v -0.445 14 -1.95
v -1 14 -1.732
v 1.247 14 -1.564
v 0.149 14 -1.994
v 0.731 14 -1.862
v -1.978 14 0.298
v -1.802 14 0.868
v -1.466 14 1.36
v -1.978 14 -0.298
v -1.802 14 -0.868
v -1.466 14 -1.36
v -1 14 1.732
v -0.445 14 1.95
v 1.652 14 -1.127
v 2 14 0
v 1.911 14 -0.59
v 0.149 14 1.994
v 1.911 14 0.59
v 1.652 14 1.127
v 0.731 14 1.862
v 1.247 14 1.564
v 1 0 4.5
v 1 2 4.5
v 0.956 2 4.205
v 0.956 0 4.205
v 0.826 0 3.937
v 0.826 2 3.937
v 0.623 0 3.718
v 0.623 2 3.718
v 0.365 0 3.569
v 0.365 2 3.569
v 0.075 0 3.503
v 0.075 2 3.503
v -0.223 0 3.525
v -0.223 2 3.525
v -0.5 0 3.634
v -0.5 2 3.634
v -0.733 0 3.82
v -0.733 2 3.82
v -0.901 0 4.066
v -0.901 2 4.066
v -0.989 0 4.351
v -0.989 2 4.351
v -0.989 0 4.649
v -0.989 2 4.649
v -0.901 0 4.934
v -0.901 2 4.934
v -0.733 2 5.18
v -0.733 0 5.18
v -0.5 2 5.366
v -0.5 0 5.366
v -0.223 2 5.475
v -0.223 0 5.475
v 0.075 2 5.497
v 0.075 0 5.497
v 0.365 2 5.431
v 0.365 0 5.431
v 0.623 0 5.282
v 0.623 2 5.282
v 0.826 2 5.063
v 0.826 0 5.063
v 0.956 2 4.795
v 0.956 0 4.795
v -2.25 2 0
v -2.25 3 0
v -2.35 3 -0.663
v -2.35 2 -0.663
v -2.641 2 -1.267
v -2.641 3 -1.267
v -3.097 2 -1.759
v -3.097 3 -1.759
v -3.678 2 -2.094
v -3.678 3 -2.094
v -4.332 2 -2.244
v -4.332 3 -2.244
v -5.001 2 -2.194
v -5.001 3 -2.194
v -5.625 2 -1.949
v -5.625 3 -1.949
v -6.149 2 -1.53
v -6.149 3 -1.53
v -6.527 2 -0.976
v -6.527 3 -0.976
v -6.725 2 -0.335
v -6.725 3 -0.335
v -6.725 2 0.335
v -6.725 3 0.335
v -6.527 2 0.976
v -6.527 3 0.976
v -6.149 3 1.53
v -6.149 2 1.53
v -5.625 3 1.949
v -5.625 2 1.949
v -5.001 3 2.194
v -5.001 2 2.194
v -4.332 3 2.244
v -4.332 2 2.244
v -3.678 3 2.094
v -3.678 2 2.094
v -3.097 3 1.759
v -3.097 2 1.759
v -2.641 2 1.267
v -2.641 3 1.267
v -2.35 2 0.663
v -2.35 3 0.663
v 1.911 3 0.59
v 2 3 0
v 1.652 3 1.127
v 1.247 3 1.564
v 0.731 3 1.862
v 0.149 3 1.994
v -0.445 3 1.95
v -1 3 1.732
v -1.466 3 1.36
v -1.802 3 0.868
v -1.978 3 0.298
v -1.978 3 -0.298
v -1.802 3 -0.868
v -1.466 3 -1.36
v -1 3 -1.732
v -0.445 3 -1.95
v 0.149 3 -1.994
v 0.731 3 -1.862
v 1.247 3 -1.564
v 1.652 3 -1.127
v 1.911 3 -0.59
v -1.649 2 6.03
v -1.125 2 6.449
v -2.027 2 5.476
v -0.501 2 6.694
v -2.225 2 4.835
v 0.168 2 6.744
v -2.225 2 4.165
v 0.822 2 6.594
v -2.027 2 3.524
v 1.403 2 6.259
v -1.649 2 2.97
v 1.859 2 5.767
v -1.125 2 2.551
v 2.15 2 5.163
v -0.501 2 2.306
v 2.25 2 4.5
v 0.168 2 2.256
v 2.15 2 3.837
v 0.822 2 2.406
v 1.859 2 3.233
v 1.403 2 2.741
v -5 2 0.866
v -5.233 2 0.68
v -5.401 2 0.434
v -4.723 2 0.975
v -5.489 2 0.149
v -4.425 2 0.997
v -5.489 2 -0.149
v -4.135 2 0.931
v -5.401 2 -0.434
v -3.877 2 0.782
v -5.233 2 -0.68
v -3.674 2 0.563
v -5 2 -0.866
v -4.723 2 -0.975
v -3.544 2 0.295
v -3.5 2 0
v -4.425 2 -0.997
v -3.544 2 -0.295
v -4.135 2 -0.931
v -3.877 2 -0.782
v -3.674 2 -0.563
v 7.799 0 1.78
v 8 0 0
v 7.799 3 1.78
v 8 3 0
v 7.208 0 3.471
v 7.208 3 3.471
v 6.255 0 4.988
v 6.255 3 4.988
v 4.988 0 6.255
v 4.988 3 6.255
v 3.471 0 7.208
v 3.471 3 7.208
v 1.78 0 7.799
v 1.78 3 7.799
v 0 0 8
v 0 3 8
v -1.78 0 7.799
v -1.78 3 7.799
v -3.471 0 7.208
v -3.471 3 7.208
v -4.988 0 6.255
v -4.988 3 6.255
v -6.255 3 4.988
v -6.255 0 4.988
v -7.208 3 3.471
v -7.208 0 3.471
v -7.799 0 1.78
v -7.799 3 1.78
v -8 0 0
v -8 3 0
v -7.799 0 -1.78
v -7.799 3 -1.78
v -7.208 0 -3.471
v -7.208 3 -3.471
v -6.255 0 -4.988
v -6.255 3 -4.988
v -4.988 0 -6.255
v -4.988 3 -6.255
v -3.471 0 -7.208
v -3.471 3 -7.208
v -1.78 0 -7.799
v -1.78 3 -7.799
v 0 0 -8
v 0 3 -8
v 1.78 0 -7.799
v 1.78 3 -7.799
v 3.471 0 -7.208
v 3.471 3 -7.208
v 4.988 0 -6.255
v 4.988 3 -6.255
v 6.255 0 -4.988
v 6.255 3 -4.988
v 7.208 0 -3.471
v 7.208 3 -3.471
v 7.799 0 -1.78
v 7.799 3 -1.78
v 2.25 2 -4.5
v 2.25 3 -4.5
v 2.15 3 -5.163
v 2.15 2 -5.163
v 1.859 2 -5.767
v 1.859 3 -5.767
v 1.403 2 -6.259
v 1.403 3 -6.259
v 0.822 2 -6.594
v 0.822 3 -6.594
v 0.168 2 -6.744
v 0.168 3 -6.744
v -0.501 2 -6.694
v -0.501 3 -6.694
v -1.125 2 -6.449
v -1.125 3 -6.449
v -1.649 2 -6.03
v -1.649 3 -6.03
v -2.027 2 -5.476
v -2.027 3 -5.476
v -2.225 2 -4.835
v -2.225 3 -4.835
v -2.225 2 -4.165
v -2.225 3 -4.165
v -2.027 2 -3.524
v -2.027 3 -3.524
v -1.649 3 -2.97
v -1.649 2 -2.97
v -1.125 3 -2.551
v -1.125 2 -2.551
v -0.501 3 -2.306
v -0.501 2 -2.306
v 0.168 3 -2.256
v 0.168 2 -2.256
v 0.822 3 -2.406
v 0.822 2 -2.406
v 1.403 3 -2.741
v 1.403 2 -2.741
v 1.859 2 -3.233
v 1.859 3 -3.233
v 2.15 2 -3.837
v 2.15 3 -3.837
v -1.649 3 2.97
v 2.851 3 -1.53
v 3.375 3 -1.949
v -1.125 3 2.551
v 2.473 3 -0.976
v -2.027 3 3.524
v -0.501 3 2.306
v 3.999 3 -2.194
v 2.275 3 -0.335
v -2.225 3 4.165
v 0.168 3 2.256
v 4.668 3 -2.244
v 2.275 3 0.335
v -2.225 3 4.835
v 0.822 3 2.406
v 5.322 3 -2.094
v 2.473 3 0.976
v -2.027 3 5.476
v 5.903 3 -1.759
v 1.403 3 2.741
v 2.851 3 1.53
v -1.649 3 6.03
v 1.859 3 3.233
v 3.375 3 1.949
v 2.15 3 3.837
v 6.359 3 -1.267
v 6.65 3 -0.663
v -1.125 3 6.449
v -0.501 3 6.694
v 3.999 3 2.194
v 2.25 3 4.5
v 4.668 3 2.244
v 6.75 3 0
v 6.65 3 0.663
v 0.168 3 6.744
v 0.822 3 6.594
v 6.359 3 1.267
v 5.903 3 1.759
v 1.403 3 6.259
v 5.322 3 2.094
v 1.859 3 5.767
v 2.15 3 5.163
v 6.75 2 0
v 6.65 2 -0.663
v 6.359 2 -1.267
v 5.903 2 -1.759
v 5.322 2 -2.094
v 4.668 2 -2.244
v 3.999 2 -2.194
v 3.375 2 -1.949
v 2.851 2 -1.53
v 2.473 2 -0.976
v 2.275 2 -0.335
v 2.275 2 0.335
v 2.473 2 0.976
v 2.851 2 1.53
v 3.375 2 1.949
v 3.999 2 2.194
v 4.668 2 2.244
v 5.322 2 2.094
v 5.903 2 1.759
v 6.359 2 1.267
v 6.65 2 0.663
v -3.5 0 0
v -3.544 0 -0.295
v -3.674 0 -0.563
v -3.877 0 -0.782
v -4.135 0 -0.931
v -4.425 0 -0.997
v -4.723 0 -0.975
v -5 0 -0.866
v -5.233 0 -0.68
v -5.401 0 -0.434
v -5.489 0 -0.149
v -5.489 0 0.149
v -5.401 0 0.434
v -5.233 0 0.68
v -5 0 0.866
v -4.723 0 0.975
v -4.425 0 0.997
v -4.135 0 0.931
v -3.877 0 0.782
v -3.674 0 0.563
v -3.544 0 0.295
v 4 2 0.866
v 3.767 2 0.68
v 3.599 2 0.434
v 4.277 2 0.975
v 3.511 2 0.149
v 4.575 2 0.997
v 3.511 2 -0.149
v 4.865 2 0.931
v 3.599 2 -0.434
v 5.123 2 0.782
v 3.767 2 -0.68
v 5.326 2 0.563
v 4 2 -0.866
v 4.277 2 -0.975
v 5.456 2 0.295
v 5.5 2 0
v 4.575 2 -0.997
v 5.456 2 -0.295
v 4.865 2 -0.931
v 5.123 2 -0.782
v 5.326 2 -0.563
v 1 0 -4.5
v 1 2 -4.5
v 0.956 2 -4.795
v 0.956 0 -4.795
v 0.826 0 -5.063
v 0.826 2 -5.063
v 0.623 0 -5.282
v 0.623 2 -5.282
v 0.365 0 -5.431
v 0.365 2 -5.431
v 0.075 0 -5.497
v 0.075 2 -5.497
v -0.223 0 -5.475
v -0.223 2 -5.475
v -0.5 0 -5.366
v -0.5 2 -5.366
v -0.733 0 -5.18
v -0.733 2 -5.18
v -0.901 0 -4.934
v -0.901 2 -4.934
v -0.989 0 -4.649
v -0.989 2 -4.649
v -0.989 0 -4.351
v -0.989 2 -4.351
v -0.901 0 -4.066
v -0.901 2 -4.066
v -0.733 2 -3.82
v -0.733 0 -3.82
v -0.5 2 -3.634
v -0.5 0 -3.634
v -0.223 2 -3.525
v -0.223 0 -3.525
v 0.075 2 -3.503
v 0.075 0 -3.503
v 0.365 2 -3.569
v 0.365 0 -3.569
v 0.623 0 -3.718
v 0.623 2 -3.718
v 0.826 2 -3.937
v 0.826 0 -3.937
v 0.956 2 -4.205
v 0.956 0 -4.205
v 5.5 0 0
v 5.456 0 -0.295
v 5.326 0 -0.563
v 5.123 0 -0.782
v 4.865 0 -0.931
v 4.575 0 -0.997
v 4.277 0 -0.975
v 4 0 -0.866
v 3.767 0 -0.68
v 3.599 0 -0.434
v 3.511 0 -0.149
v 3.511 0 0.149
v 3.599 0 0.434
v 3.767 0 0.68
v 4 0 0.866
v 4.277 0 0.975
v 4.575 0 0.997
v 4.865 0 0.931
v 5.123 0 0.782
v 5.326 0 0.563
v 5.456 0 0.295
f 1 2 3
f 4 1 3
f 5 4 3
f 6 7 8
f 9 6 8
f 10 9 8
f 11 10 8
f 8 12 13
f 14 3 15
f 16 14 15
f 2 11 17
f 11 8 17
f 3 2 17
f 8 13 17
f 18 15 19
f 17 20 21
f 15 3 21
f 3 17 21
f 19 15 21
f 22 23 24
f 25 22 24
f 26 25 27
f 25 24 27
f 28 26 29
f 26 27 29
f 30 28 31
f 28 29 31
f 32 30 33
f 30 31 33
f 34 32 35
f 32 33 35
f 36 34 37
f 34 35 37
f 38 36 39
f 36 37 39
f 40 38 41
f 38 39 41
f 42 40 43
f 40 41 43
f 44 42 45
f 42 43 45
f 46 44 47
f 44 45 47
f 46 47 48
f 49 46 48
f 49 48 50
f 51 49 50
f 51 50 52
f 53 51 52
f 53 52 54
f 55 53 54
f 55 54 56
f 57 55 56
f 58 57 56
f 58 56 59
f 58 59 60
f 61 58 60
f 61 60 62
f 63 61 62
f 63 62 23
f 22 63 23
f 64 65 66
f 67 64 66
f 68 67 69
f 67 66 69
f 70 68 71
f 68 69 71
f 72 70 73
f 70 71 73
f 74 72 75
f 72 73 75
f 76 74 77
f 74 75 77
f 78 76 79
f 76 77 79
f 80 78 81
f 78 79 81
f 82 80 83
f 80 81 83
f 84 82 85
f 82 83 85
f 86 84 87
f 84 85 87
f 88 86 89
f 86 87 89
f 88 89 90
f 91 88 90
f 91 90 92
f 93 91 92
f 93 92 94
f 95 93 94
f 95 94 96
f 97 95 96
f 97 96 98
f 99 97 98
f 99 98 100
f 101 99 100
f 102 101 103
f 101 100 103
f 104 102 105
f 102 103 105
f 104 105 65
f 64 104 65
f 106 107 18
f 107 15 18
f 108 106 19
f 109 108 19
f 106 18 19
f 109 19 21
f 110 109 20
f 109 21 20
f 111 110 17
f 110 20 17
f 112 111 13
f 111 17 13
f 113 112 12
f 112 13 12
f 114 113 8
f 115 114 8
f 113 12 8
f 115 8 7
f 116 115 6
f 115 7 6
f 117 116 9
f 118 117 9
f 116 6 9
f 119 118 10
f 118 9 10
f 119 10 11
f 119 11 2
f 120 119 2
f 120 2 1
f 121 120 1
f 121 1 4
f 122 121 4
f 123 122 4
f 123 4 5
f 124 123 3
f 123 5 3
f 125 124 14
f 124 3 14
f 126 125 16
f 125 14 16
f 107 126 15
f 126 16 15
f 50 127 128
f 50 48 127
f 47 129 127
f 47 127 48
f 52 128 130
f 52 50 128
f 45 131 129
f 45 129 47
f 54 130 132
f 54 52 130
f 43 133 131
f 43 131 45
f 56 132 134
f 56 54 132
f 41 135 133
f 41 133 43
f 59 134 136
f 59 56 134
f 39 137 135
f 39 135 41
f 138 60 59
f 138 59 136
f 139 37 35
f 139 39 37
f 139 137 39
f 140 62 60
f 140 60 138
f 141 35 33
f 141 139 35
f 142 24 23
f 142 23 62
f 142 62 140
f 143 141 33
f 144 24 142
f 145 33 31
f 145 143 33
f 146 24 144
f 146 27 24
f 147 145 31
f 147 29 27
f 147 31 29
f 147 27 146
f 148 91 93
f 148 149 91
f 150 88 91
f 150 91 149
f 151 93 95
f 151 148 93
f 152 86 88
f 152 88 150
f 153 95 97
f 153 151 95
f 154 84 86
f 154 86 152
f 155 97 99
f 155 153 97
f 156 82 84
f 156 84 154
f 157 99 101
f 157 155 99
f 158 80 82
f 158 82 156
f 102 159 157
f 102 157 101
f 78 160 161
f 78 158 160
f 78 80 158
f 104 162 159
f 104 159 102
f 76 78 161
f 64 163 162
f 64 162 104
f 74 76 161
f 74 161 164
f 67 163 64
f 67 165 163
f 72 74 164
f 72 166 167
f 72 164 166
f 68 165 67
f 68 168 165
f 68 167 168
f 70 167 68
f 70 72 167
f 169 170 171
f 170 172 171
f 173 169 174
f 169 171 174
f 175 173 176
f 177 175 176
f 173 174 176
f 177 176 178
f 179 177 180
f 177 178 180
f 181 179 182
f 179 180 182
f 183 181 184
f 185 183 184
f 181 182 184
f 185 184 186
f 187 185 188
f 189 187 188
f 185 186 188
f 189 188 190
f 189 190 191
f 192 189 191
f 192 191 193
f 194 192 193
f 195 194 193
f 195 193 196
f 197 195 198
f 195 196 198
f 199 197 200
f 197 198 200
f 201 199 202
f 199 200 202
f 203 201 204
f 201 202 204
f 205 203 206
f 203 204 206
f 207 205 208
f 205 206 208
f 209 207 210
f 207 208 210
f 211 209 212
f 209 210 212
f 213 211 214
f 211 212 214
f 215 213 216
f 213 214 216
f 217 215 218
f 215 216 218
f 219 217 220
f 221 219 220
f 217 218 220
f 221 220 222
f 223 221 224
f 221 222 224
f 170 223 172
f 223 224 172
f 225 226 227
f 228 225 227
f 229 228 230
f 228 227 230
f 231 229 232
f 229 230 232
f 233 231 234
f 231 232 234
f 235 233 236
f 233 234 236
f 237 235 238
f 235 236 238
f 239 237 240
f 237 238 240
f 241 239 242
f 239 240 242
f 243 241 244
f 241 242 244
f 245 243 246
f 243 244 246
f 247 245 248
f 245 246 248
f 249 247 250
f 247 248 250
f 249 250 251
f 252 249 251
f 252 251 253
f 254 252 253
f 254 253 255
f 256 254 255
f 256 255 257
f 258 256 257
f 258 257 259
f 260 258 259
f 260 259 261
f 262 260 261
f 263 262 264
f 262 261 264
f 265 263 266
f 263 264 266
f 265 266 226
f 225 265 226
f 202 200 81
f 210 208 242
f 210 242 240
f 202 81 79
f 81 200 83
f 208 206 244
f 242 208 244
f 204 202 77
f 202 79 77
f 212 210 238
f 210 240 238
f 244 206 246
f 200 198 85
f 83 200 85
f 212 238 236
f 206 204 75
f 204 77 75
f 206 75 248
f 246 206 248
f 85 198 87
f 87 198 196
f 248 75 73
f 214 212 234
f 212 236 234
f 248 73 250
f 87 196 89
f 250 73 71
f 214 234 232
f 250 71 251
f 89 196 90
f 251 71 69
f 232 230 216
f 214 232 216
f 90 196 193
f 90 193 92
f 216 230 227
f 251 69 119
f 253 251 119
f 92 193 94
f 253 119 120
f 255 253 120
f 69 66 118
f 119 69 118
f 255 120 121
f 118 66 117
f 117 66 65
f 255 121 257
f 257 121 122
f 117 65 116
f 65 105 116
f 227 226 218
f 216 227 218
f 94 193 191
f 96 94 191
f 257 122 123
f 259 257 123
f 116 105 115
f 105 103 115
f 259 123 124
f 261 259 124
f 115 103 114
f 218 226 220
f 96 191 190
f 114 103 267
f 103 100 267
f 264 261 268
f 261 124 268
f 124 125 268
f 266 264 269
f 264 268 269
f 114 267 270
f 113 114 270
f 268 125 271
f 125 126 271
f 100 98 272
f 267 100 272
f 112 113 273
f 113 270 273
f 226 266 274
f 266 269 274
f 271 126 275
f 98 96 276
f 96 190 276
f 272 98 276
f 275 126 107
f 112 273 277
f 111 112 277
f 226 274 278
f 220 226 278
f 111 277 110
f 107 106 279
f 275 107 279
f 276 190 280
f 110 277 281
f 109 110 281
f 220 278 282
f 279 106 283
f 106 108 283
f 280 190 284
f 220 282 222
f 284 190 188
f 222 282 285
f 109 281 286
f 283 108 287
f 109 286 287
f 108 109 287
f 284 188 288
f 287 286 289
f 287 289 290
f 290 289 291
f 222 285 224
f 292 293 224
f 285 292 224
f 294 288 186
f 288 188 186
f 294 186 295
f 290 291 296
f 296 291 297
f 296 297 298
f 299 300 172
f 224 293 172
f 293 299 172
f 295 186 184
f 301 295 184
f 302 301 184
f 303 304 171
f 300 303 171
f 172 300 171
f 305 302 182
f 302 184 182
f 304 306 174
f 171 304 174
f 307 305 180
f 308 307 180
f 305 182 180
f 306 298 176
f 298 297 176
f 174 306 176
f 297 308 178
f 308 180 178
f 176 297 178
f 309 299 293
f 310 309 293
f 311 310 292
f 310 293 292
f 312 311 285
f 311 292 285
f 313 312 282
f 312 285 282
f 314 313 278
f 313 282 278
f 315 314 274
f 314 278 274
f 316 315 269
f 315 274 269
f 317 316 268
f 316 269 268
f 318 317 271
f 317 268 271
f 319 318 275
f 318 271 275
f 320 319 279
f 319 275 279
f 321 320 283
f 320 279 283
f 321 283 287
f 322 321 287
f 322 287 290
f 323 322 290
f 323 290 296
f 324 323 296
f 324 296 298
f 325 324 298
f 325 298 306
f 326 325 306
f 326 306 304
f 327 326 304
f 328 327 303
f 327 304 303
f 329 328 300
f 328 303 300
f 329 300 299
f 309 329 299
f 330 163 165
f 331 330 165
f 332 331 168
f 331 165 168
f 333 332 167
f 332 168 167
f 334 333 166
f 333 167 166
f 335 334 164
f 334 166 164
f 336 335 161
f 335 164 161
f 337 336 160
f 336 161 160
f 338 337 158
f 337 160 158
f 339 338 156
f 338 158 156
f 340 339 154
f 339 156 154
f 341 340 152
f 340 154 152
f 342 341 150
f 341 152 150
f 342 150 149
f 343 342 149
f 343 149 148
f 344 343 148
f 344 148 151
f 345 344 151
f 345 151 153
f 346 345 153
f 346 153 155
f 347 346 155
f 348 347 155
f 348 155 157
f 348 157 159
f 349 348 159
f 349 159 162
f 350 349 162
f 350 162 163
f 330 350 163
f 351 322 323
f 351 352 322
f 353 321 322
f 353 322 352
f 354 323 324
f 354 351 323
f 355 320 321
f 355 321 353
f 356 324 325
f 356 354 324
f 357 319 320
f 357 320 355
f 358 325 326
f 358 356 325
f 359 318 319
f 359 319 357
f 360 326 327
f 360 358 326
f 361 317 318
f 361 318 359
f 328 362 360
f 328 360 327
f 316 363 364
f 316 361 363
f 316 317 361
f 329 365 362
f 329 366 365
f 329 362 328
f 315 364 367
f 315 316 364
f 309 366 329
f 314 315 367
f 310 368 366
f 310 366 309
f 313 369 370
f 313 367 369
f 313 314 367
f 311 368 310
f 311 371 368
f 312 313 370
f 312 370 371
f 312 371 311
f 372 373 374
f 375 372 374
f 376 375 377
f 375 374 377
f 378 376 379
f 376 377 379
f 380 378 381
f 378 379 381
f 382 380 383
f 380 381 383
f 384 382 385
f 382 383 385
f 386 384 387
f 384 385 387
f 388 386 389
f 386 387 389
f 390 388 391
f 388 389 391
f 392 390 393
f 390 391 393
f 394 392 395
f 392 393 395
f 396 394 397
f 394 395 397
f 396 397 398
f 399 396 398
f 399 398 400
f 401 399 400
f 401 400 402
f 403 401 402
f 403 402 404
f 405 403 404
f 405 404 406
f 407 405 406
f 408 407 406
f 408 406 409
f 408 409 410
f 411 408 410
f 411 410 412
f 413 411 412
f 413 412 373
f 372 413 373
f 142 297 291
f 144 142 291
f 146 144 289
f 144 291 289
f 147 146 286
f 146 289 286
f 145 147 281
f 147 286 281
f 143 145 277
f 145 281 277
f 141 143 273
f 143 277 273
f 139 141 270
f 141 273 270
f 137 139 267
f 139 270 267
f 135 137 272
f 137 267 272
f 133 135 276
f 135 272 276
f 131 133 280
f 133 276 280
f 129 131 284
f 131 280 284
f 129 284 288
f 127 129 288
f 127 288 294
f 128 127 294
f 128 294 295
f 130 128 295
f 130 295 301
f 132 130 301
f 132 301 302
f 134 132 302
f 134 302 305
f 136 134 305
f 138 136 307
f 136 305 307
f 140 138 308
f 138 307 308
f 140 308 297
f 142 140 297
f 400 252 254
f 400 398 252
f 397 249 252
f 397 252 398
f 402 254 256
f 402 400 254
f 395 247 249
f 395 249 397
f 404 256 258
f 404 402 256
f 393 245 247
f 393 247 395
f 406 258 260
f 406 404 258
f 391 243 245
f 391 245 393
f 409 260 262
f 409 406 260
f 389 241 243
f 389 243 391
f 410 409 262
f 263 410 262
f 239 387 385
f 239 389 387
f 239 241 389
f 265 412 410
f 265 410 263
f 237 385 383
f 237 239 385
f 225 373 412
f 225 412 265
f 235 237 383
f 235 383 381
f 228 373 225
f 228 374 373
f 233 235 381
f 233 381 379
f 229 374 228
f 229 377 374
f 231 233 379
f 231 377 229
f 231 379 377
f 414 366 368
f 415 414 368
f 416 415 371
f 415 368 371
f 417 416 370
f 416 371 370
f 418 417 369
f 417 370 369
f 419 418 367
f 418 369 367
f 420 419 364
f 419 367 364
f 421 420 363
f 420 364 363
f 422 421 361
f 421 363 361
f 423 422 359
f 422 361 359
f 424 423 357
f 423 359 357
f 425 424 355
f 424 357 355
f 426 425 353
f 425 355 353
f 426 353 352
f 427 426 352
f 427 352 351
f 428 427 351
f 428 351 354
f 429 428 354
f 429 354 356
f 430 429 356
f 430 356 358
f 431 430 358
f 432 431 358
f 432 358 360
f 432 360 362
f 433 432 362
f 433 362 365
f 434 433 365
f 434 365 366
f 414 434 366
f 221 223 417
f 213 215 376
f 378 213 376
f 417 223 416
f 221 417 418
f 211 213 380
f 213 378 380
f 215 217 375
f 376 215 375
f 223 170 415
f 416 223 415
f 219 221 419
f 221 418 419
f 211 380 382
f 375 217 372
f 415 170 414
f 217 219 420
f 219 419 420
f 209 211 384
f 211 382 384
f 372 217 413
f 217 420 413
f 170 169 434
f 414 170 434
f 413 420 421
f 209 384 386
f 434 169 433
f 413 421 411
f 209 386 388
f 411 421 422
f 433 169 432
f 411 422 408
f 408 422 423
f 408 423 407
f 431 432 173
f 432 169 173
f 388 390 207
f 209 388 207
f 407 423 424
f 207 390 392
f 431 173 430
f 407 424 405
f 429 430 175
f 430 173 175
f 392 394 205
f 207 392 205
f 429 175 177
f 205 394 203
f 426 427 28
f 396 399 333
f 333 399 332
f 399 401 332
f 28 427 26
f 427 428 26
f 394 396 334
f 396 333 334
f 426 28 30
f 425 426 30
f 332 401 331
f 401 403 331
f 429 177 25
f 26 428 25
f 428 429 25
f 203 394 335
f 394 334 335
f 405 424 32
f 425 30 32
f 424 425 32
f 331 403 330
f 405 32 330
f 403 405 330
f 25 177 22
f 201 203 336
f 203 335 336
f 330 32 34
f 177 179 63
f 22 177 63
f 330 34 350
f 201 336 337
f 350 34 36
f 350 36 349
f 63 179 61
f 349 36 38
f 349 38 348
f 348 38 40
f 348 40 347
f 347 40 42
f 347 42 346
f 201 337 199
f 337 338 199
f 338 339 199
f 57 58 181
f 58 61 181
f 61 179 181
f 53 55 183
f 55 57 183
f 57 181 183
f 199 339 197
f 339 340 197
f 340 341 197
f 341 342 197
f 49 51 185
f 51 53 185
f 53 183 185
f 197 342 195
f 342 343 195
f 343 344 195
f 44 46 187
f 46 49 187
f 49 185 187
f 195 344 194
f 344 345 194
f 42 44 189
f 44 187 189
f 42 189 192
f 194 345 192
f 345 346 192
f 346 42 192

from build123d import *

# Parameters (mm, degrees)
SKETCH3_R          = 1
CUT_EXTRUDE1_DEPTH = 4
SKETCH4_R          = 2.25
CUT_EXTRUDE2_DEPTH = 1


with BuildPart() as part:
    # Sketch1 → Revolve1 (revolve)
    with BuildSketch(Plane.XY):
        Polygon((0, 0), (8, 0), (8, 3), (2, 3), (2, 14), (0, 14), align=None)
    revolve(axis=Axis((0, 14, 0), (0, -1, 0)))

    # Sketch3 → Cut-Extrude1 (cut, through all)
    with BuildSketch(Plane(origin=(0, 3, 0), x_dir=(1, 0, 0), z_dir=(0, 1, 0))):
        with Locations((0, 4.5)):
            Circle(SKETCH3_R)
        with Locations((4.5, 0)):
            Circle(SKETCH3_R)
        with Locations((0, -4.5)):
            Circle(SKETCH3_R)
        with Locations((-4.5, 0)):
            Circle(SKETCH3_R)
    extrude(amount=-CUT_EXTRUDE1_DEPTH, mode=Mode.SUBTRACT)

    # Sketch4 → Cut-Extrude2 (cut)
    with BuildSketch(Plane(origin=(0, 3, 0), x_dir=(1, 0, 0), z_dir=(0, 1, 0))):
        with Locations((0, 4.5)):
            Circle(SKETCH4_R)
        with Locations((4.5, 0)):
            Circle(SKETCH4_R)
        with Locations((0, -4.5)):
            Circle(SKETCH4_R)
        with Locations((-4.5, 0)):
            Circle(SKETCH4_R)
    extrude(amount=-CUT_EXTRUDE2_DEPTH, mode=Mode.SUBTRACT)


solid = part.part
